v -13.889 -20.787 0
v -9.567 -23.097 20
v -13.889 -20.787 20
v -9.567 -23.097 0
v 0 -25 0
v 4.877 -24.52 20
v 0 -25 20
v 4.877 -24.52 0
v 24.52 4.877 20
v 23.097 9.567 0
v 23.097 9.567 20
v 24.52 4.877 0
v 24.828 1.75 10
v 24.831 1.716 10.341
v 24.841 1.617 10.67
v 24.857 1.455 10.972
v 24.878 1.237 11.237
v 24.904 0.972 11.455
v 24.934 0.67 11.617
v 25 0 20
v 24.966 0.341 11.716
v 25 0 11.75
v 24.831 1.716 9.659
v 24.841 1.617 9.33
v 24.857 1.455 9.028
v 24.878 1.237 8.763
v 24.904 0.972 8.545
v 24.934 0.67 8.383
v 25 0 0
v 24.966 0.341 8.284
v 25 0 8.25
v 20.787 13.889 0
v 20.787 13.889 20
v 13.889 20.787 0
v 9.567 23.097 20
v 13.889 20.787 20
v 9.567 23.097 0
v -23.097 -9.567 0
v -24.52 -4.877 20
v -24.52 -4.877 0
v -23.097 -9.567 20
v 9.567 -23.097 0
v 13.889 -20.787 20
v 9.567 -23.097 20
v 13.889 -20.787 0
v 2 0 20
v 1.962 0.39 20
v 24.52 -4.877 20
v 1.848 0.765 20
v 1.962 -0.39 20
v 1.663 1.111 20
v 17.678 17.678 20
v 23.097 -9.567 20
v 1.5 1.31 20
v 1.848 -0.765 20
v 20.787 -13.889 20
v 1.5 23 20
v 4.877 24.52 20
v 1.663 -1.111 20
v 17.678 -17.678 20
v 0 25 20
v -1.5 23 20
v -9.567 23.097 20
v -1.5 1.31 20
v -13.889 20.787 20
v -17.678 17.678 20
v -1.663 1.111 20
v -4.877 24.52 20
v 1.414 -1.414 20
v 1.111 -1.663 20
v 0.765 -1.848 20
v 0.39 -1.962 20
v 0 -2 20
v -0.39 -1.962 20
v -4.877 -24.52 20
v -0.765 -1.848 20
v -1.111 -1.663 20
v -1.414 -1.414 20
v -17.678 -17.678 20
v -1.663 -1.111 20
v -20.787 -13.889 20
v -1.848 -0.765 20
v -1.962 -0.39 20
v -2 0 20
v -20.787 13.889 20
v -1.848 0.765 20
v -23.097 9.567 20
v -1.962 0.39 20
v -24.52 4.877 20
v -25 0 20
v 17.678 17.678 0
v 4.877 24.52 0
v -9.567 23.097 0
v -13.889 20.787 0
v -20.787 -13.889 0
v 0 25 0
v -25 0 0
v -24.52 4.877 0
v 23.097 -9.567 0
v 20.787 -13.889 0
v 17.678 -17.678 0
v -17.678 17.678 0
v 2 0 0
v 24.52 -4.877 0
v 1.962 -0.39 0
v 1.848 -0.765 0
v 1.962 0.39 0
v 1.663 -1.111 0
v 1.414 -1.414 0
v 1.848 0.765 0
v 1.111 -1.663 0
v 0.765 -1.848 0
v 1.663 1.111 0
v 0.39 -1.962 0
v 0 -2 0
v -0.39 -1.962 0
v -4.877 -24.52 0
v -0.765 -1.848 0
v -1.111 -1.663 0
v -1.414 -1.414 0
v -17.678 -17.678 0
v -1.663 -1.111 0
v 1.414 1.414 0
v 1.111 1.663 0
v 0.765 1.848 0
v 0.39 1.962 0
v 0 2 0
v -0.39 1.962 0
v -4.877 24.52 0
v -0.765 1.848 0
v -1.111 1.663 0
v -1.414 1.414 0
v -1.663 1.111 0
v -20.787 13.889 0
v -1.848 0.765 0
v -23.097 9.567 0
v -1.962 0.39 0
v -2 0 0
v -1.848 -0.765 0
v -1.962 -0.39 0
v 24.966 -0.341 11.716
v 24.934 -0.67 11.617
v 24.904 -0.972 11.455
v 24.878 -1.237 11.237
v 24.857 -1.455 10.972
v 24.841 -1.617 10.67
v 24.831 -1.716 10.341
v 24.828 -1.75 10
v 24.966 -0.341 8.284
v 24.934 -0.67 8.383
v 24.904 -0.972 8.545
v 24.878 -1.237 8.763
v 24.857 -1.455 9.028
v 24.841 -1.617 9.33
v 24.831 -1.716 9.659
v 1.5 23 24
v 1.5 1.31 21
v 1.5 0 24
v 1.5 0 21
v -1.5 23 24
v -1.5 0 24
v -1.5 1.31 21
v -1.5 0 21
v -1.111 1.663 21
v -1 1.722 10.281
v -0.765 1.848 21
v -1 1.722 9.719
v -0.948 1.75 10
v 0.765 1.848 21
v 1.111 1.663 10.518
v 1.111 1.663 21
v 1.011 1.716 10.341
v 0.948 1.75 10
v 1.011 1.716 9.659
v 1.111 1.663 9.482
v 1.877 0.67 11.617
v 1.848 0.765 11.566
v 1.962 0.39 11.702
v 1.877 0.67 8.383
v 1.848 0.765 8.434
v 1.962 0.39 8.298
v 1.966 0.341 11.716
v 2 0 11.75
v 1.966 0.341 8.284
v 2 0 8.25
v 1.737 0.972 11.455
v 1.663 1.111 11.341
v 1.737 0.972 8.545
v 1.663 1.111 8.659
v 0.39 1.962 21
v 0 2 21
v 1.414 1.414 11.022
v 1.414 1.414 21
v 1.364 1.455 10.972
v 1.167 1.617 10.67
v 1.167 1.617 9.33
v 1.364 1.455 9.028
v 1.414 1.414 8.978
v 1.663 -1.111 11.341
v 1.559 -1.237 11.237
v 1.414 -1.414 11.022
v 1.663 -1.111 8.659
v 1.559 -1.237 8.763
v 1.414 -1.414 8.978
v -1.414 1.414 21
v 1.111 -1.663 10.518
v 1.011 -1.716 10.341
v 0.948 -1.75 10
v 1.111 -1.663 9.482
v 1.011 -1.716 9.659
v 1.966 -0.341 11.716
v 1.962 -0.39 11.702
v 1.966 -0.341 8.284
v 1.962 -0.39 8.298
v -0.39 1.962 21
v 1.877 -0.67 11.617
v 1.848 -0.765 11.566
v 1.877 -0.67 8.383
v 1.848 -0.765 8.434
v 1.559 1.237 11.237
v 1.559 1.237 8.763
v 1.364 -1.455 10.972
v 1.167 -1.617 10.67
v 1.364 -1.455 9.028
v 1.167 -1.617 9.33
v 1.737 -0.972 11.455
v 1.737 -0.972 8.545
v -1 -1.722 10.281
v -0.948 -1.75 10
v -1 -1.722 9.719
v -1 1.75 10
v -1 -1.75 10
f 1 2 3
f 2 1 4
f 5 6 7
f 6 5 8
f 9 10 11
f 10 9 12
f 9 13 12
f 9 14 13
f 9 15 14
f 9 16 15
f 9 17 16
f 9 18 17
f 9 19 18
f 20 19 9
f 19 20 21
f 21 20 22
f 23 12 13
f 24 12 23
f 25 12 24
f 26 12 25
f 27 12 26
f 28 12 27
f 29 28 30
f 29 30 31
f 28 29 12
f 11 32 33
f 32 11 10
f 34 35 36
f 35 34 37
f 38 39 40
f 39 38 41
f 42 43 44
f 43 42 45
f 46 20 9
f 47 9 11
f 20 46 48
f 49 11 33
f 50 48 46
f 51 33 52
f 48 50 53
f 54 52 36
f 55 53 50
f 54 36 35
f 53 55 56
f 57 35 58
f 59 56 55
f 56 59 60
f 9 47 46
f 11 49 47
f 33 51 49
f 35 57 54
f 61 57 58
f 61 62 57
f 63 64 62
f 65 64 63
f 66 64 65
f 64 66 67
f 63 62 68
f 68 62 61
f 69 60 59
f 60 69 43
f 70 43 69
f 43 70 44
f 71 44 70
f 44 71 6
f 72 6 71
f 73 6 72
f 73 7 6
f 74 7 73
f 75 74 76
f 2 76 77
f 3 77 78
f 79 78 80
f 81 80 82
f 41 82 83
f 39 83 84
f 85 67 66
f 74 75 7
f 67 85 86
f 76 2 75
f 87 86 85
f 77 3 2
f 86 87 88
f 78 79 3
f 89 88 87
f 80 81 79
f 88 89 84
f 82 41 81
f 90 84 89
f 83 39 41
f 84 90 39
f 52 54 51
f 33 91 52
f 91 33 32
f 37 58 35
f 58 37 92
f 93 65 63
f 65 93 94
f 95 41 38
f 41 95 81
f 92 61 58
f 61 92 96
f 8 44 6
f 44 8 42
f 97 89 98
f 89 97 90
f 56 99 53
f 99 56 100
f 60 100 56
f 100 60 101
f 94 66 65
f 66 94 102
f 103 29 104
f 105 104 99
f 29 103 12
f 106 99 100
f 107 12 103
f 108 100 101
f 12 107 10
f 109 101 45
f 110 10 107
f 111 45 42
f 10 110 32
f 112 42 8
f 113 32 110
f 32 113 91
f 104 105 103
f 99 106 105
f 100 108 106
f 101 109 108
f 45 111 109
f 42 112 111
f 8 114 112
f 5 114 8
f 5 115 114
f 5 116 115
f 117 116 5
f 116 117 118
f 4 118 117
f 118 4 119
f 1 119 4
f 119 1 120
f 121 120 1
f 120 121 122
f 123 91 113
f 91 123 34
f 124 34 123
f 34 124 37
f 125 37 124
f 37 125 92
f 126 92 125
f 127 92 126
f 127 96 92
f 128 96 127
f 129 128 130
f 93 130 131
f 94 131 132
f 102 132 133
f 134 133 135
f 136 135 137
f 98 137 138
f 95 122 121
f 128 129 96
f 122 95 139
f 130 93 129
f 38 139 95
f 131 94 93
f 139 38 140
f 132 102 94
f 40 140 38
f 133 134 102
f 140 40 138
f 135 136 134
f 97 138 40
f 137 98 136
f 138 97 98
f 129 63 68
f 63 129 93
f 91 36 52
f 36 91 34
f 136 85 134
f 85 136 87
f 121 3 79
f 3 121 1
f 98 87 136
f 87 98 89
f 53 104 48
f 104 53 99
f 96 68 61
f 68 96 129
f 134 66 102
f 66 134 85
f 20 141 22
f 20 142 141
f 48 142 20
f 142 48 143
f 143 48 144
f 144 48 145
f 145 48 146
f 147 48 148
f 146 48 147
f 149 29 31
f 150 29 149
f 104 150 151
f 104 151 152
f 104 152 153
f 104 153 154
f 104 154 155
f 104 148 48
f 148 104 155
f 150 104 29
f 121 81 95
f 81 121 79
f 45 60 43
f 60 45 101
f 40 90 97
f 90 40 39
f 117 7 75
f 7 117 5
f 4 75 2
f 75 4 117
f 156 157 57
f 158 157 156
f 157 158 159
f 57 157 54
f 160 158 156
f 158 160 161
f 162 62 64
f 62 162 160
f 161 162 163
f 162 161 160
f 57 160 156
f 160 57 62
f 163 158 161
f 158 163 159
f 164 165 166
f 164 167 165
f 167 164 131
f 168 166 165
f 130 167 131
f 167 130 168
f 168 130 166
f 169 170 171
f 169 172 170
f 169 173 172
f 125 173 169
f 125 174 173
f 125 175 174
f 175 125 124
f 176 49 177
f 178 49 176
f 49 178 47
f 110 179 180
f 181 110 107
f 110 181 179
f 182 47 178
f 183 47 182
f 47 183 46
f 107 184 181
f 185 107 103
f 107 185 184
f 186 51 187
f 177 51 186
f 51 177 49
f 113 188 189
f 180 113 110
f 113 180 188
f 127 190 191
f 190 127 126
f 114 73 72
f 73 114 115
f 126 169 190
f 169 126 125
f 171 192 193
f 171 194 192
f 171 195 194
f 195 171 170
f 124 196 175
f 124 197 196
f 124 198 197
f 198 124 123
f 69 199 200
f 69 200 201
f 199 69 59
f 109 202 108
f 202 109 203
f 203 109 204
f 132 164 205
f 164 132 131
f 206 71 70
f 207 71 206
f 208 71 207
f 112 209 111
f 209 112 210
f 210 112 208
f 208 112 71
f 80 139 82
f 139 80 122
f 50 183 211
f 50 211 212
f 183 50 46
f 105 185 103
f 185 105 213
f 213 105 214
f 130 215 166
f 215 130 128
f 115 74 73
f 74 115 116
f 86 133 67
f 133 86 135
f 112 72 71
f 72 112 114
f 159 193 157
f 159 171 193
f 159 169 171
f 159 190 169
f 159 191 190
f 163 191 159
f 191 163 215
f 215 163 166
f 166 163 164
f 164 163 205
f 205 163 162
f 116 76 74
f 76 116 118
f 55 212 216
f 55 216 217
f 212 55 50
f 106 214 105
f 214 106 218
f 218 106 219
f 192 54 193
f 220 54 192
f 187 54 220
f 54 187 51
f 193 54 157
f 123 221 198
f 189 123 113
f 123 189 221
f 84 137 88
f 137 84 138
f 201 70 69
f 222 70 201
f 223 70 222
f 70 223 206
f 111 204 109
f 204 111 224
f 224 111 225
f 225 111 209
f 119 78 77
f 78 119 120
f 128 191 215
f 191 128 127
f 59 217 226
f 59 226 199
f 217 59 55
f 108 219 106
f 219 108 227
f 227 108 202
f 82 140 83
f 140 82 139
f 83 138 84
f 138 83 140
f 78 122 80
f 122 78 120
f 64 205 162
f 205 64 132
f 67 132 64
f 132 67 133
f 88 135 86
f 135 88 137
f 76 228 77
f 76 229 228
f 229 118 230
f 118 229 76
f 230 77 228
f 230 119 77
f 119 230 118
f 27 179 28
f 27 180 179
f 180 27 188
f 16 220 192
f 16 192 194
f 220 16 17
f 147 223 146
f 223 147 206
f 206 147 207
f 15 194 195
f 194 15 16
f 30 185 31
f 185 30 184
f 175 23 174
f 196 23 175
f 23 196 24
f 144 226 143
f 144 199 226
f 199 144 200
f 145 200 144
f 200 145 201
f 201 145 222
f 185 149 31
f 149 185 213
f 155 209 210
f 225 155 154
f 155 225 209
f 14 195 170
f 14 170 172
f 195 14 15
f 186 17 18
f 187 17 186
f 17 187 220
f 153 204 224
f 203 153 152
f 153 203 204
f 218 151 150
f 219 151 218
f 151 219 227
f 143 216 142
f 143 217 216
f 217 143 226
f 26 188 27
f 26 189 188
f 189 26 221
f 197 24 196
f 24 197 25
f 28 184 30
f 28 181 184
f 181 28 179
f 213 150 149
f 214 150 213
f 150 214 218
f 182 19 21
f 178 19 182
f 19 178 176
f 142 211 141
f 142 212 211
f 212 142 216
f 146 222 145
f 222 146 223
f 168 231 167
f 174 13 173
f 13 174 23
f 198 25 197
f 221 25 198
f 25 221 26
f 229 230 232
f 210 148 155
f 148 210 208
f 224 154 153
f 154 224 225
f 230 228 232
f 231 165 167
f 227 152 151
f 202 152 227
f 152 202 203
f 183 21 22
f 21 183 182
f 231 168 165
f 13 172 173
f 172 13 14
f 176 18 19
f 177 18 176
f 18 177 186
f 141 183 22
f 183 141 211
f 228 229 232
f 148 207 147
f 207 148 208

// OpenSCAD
$fn = 32;

// ----------------------------------------------------------------------
// Control knob: pointer knob
// ----------------------------------------------------------------------

// --- parameters (mm) ---
rib_w = 3;                // pointer rib width
rib_h = 5;                // pointer rib height
knob_d = 50;              // knob body diameter
knob_h = 20;              // knob body height
bore_d = 4;               // shaft bore diameter
set_d = 3.5;              // set screw bore diameter

rib_poke = rib_h - 1;  // rib height above the top
total_h = knob_h + rib_h - 1;  // overall height

difference() {
  union() {
    cylinder(h = knob_h, d = knob_d);
    translate([-rib_w / 2, 0, knob_h - 1])
      cube([rib_w, knob_d / 2 - 2, rib_h]);
  }
  translate([0, 0, -1]) cylinder(h = knob_h + 2, d = bore_d);
  translate([-1, 0, knob_h / 2]) rotate([0, 90, 0])
    cylinder(h = knob_d / 2 + bore_d / 2 + 2, d = set_d);}
